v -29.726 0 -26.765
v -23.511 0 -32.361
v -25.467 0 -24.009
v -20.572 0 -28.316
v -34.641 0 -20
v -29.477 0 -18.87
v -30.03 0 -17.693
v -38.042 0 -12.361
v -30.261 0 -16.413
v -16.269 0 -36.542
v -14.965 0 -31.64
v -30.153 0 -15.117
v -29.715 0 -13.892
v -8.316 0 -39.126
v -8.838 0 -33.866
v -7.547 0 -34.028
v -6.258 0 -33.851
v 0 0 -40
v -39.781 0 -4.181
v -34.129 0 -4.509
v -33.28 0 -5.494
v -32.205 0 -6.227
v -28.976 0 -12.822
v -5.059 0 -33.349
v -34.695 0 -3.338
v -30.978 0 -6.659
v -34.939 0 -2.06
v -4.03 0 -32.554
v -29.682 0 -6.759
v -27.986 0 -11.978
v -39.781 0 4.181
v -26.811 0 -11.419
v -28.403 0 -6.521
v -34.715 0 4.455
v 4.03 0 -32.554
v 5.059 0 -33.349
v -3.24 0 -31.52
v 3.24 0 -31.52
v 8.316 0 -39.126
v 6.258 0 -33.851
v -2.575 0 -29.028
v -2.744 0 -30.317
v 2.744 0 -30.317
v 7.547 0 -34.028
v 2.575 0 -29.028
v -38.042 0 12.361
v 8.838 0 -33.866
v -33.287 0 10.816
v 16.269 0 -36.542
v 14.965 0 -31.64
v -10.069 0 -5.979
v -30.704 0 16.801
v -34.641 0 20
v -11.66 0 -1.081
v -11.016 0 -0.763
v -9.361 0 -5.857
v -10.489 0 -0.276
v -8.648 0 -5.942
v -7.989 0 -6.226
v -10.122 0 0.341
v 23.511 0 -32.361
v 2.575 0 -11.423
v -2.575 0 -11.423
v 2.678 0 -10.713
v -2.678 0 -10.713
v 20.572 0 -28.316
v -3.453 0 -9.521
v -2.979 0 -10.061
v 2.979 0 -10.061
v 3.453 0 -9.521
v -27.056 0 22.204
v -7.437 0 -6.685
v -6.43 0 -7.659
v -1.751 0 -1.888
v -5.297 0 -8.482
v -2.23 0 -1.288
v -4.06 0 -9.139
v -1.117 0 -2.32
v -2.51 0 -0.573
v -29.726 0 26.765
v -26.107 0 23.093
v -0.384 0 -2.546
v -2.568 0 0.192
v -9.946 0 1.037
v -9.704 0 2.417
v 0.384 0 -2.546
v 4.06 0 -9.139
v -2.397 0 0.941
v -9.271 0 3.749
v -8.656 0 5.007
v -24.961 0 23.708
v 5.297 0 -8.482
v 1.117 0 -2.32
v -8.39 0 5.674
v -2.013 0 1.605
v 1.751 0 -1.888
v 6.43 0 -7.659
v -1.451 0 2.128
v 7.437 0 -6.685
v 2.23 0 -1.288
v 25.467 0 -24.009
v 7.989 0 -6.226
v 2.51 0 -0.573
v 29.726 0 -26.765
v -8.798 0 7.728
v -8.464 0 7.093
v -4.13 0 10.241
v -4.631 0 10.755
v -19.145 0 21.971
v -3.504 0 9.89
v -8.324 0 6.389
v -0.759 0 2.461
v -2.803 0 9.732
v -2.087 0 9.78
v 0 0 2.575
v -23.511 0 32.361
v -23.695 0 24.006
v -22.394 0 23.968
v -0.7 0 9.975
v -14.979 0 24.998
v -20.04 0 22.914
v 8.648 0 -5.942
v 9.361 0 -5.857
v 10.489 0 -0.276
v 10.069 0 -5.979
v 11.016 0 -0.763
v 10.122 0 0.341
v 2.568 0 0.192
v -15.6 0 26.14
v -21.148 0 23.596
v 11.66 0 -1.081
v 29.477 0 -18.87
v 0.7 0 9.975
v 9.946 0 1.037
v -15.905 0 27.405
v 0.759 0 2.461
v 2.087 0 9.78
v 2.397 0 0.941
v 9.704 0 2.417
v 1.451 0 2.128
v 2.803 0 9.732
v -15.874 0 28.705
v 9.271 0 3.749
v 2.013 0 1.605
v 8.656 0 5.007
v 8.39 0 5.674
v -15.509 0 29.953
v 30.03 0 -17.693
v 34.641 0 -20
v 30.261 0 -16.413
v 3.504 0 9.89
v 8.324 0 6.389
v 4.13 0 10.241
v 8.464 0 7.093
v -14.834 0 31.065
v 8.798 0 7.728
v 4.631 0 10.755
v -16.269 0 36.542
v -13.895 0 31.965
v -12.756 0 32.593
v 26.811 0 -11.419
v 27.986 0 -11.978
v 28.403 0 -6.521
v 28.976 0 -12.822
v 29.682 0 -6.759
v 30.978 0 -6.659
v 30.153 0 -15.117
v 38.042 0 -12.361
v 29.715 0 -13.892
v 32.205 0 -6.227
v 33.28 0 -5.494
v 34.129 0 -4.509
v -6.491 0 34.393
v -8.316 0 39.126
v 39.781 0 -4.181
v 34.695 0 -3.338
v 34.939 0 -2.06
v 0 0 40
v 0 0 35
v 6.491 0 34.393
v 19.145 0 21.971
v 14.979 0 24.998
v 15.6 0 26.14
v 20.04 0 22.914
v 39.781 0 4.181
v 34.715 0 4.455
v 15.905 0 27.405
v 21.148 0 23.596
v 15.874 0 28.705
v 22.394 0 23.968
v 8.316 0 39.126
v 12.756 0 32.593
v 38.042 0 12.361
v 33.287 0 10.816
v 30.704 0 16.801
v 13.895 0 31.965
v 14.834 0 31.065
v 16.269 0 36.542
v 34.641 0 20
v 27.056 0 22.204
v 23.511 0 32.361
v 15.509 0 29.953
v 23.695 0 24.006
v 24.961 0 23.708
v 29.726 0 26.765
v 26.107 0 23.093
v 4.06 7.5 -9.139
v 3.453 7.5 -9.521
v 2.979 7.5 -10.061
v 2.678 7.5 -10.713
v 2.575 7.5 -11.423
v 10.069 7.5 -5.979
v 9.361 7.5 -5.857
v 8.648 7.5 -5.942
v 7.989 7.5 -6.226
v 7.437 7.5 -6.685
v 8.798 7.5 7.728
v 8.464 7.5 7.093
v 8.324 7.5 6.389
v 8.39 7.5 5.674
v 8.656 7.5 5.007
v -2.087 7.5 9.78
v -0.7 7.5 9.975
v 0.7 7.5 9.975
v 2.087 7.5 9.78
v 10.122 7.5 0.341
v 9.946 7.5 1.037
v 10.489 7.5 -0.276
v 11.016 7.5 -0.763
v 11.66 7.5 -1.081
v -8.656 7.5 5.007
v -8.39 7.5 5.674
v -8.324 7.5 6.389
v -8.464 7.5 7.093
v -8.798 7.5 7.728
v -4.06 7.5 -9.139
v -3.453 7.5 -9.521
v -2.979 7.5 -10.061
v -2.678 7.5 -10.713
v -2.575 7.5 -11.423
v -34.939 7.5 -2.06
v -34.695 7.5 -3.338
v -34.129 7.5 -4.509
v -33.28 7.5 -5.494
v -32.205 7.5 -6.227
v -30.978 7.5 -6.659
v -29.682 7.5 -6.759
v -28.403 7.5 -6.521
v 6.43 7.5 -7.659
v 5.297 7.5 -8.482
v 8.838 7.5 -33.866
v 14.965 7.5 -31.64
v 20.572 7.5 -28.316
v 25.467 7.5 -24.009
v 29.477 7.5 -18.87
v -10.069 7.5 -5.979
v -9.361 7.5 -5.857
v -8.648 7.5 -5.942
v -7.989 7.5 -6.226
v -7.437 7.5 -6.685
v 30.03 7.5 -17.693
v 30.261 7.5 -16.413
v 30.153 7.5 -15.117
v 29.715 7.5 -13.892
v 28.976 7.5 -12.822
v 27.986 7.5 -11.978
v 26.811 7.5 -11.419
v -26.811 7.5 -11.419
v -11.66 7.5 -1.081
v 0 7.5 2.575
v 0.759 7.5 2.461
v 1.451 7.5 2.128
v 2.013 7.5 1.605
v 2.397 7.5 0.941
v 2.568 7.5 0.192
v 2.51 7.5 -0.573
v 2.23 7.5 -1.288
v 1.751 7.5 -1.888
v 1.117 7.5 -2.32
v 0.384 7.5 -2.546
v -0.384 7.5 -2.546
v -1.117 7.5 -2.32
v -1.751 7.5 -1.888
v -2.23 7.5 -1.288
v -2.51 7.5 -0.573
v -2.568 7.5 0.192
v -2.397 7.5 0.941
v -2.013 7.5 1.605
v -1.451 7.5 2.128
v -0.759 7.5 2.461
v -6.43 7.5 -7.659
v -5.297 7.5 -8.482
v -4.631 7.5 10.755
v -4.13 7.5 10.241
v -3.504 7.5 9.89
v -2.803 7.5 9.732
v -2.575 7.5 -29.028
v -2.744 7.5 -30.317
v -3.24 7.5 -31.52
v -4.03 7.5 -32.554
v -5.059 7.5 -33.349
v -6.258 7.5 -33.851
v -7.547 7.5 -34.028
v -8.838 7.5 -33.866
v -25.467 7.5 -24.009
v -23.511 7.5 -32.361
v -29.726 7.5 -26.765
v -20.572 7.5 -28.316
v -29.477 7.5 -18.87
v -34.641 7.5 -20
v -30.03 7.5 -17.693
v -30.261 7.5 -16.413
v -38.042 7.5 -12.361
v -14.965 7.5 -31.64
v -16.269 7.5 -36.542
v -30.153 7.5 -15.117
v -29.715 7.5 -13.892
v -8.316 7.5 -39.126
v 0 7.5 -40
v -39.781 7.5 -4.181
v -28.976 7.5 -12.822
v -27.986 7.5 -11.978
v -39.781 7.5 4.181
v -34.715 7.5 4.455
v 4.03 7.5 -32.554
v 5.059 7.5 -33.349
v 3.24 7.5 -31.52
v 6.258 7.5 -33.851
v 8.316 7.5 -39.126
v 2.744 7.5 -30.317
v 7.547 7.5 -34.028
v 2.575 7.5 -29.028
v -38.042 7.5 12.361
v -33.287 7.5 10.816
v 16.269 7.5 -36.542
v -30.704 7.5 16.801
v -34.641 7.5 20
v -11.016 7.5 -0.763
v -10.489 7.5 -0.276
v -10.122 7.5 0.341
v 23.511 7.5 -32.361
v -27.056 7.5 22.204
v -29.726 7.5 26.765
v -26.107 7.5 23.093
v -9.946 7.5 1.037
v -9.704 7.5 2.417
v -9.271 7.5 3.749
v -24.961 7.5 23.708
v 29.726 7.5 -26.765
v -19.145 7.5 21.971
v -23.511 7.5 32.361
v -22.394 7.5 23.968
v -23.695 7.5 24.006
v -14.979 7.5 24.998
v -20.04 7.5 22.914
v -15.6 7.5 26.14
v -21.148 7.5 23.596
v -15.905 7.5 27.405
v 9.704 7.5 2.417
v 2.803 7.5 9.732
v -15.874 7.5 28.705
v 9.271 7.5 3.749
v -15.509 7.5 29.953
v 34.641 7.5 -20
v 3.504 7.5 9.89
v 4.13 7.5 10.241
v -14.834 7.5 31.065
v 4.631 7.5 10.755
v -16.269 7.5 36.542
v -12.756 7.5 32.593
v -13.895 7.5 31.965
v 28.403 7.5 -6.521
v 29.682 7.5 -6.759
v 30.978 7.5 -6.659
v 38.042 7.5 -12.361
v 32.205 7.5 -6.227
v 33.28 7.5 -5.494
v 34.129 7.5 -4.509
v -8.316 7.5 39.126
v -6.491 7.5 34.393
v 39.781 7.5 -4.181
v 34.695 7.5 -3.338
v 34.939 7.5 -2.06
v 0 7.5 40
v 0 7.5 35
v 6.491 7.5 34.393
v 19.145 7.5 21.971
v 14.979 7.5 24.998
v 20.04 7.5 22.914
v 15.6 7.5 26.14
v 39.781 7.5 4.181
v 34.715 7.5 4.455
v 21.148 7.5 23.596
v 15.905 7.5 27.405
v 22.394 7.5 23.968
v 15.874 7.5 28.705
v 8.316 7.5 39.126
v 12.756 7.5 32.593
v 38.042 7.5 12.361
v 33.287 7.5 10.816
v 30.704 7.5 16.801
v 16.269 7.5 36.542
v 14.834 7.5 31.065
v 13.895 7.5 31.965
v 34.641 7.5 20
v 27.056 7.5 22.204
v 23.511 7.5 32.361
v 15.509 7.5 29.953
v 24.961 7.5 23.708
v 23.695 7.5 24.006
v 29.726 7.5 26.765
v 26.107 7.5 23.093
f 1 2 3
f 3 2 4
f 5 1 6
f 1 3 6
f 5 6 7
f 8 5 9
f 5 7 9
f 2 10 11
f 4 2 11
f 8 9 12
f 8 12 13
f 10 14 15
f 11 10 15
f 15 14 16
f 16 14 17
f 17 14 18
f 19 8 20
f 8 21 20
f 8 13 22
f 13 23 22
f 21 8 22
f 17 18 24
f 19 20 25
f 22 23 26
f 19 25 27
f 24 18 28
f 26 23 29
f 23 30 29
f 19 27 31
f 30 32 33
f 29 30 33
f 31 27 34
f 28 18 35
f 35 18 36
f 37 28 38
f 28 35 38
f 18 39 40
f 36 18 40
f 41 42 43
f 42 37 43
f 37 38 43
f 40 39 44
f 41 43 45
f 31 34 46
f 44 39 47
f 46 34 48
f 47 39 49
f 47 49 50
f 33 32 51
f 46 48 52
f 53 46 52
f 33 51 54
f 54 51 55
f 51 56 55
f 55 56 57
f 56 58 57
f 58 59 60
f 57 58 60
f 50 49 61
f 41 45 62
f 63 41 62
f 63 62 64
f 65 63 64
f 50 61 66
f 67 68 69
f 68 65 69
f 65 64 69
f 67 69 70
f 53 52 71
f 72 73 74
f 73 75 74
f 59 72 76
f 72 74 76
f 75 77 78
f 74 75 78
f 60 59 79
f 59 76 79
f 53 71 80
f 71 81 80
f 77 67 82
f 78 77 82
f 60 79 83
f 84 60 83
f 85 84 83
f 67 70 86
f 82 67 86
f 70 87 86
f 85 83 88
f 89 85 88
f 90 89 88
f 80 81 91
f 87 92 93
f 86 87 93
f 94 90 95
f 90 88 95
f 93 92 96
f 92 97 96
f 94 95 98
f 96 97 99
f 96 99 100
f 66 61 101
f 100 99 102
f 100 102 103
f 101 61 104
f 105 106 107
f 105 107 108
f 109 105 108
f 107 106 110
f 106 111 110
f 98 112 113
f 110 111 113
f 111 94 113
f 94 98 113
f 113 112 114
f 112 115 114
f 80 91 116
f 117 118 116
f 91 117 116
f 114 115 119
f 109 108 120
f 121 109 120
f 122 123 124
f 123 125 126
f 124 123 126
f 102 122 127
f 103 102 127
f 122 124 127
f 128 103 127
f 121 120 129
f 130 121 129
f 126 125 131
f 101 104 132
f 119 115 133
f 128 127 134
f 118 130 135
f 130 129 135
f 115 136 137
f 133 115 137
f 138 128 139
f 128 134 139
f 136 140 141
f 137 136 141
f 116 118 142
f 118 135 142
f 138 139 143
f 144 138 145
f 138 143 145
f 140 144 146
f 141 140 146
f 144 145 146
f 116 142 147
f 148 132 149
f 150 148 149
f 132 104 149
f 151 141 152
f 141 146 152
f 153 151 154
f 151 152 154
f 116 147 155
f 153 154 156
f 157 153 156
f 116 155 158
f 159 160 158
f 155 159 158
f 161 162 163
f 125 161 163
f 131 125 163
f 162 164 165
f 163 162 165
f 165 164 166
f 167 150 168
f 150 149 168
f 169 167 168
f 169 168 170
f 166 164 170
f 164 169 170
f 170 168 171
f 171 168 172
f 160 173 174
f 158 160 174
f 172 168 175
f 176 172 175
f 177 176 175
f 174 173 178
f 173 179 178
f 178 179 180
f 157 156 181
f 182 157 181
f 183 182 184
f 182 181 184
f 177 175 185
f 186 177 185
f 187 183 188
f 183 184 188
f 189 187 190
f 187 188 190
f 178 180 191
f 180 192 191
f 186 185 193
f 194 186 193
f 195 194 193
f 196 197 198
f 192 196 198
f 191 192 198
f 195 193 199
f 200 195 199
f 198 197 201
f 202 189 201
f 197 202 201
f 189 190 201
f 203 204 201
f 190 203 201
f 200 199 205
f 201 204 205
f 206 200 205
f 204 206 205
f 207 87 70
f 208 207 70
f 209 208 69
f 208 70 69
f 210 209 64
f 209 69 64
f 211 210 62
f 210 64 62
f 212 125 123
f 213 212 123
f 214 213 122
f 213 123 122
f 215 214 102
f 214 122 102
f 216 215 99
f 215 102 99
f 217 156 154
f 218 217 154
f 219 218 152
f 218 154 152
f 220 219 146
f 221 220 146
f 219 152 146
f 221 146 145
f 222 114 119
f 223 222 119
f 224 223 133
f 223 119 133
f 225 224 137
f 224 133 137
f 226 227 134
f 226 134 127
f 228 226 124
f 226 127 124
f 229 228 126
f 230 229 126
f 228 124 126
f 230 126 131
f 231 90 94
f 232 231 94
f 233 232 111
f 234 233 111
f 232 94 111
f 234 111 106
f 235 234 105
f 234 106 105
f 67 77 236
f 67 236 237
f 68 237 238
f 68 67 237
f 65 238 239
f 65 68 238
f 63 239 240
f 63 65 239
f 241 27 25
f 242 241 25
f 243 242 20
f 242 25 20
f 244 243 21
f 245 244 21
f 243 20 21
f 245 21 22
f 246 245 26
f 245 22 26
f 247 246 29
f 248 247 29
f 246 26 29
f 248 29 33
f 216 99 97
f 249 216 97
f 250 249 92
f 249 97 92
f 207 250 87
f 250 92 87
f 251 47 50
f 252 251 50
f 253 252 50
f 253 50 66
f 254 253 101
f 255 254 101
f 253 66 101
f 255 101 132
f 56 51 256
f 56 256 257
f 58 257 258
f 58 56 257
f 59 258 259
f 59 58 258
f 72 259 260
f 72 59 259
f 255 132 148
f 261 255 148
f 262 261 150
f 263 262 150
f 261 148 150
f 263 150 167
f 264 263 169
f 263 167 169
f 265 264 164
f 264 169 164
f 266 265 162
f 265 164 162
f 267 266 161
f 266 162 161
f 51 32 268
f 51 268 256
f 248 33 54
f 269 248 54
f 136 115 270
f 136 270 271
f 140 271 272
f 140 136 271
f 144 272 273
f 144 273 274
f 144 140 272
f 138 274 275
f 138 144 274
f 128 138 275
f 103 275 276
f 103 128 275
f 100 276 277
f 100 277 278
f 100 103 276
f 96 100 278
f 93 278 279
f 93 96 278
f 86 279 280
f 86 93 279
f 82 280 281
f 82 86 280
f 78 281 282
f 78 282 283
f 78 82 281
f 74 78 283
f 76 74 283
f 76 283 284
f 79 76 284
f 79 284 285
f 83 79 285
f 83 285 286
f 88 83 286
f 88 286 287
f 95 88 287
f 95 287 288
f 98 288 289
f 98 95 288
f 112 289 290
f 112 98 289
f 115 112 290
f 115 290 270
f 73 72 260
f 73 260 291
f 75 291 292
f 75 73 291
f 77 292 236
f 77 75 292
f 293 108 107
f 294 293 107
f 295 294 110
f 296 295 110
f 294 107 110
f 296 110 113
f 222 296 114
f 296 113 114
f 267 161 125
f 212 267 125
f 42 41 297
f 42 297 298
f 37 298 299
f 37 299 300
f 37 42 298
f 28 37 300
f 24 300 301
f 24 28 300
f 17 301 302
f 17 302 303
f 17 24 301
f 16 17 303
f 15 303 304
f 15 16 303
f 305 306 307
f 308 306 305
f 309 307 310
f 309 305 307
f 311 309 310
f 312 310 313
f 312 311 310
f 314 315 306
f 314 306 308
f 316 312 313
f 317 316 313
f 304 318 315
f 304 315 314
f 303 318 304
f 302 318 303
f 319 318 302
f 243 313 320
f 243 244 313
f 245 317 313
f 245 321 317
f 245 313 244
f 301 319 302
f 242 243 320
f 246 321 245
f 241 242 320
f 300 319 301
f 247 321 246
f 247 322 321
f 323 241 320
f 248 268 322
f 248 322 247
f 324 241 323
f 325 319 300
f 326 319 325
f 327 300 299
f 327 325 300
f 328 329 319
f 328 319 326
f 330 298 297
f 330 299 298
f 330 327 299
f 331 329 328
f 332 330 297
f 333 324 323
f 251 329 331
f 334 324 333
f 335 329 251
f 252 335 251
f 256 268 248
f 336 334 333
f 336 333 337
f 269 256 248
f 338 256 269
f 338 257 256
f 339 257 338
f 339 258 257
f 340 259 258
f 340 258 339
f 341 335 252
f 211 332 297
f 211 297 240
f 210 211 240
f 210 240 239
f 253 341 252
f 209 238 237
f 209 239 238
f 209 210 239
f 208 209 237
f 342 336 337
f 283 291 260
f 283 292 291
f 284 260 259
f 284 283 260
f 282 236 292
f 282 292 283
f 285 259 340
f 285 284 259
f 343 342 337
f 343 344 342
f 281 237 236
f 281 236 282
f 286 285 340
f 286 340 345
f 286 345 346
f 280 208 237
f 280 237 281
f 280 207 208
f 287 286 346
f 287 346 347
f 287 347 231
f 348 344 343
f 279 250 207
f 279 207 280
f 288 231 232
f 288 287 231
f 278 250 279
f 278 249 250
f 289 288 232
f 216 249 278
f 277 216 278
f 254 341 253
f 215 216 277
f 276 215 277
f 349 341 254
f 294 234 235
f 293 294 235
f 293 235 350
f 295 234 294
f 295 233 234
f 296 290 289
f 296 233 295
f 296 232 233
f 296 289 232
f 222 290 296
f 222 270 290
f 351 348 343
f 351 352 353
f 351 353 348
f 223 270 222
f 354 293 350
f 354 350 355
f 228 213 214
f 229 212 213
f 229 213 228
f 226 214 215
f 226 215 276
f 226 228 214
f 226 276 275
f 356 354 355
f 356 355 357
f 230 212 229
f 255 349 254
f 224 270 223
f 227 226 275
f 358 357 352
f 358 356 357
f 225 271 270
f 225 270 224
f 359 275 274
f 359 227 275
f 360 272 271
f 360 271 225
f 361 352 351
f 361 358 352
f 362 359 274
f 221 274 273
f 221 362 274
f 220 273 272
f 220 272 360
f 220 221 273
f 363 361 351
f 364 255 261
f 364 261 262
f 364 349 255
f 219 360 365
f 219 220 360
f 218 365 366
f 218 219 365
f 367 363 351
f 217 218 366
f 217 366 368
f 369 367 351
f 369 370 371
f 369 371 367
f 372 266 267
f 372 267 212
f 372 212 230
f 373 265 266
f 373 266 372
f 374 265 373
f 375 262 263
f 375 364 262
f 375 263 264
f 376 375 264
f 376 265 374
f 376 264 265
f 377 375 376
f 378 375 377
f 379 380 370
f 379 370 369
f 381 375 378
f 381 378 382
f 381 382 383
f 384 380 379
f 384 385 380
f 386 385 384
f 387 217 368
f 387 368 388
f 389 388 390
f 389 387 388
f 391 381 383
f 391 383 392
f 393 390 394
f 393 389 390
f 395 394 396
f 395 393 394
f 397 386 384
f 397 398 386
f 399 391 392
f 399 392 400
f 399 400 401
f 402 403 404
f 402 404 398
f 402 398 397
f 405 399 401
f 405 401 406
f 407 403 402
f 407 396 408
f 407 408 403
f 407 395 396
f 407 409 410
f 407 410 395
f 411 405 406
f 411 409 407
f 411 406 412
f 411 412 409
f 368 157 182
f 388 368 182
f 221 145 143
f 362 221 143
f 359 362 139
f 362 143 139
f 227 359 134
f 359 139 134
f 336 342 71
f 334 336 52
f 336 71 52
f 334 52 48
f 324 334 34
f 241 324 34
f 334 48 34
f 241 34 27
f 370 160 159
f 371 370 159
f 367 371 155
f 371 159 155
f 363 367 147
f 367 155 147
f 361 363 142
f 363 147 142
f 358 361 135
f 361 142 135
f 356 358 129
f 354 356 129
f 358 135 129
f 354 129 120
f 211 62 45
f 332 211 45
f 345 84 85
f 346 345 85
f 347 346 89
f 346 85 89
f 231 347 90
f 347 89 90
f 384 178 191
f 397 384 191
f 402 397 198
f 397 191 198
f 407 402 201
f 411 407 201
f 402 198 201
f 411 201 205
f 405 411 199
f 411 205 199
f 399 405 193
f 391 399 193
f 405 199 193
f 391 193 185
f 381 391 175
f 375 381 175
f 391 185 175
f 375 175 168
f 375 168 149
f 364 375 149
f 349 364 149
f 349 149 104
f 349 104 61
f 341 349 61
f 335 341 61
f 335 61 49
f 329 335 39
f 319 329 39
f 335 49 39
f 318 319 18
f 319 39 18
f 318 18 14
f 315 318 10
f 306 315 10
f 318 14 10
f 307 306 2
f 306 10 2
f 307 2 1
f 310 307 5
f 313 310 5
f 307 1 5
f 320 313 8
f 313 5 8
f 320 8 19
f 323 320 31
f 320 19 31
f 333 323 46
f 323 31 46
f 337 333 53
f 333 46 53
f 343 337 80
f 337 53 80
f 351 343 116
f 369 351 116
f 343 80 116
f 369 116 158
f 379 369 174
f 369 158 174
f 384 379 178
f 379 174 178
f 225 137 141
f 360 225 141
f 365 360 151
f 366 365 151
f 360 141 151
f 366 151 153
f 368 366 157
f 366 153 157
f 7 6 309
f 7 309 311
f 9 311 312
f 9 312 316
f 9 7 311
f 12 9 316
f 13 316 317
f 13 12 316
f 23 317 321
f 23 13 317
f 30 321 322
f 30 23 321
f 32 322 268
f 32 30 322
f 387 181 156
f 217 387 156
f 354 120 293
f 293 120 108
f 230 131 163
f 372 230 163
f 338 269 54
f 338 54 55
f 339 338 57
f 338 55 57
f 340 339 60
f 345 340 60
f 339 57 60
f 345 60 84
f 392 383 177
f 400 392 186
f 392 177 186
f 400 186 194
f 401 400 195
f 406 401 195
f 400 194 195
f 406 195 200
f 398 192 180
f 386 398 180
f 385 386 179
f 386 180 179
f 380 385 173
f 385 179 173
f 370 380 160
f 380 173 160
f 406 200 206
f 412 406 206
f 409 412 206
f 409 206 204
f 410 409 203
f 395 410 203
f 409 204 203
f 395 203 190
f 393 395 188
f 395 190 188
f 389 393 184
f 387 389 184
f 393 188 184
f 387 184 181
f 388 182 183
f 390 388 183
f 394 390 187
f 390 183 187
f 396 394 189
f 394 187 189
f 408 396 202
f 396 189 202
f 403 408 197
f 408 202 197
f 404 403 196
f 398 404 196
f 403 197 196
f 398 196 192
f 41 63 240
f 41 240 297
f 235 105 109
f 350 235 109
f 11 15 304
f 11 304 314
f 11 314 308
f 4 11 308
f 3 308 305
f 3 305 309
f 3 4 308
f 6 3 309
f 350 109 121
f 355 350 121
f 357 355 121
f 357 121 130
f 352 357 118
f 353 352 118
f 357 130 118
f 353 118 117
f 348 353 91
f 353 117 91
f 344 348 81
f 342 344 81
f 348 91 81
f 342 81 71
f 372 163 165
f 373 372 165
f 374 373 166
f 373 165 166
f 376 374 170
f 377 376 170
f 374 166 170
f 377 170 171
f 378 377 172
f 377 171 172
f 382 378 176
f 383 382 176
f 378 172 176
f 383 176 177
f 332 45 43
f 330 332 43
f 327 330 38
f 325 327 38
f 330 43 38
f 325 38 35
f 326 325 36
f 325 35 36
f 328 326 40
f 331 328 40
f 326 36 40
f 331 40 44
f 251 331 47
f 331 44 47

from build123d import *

# Parameters (mm, degrees)
SKETCH1_R           = 40
SKETCH1_R_2         = 2.575
BOSS_EXTRUDE1_DEPTH = 7.5


with BuildPart() as part:
    # Sketch1 → Boss-Extrude1 (new body)
    with BuildSketch(Plane(origin=(0, 0, 0), x_dir=(1, 0, 0), z_dir=(0, 1, 0))):
        with Locations(Location((0, 0, 0), (0, 0, 270))):
            Circle(SKETCH1_R)
        with Locations(Location((0, 0, 0), (0, 0, 270))):
            Circle(SKETCH1_R_2, mode=Mode.SUBTRACT)
        with BuildLine():
            Line((-2.575, 11.423413457), (-2.575, 29.027906831))
            ThreePointArc((-2.575, 29.027906831), (-4.518245185, 32.984704779), (-8.8375, 33.865891303))
            ThreePointArc((-8.8375, 33.865891303), (-20.57248383, 28.315594803), (-29.477438916, 18.870097905))
            ThreePointArc((-29.477438916, 18.870097905), (-29.974103871, 14.489940856), (-26.811461186, 11.419087051))
            Line((-26.811461186, 11.419087051), (-10.068593046, 5.978999421))
            ThreePointArc((-10.068593046, 5.978999421), (-8.648029574, 5.942087171), (-7.436840448, 6.68531257))
            ThreePointArc((-7.436840448, 6.68531257), (-5.877852523, 8.090169944), (-4.06, 9.138730765))
            ThreePointArc((-4.06, 9.138730765), (-2.978872618, 10.060970797), (-2.575, 11.423413457))
        make_face(mode=Mode.SUBTRACT)
        with BuildLine():
            Line((2.575, 11.423413457), (2.575, 29.027906831))
            ThreePointArc((2.575, 29.027906831), (4.518245185, 32.984704779), (8.8375, 33.865891303))
            ThreePointArc((8.8375, 33.865891303), (20.57248383, 28.315594803), (29.477438916, 18.870097905))
            ThreePointArc((29.477438916, 18.870097905), (29.974103871, 14.489940856), (26.811461186, 11.419087051))
            Line((26.811461186, 11.419087051), (10.068593046, 5.978999421))
            ThreePointArc((10.068593046, 5.978999421), (8.648029574, 5.942087171), (7.436840448, 6.68531257))
            ThreePointArc((7.436840448, 6.68531257), (5.877852523, 8.090169944), (4.06, 9.138730765))
            ThreePointArc((4.06, 9.138730765), (2.978872618, 10.060970797), (2.575, 11.423413457))
        make_face(mode=Mode.SUBTRACT)
        with BuildLine():
            Line((11.660030567, 1.081058362), (28.402898707, 6.521145993))
            ThreePointArc((28.402898707, 6.521145993), (32.766532965, 5.895727806), (34.939314292, 2.06017398))
            ThreePointArc((34.939314292, 2.06017398), (33.28697807, -10.815594803), (27.055559151, -22.203529427))
            ThreePointArc((27.055559151, -22.203529427), (23.04326016, -24.029428835), (19.145394301, -21.970522913))
            Line((19.145394301, -21.970522913), (8.797732721, -7.728188595))
            ThreePointArc((8.797732721, -7.728188595), (8.323648831, -6.388558961), (8.656220166, -5.006980372))
            ThreePointArc((8.656220166, -5.006980372), (9.510565163, -3.090169944), (9.946058442, -1.037266343))
            ThreePointArc((9.946058442, -1.037266343), (10.4890741, 0.275934741), (11.660030567, 1.081058362))
        make_face(mode=Mode.SUBTRACT)
        with BuildLine():
            Line((4.6312952, -10.755282645), (14.97895678, -24.997616962))
            ThreePointArc((14.97895678, -24.997616962), (15.732585881, -29.340944607), (12.756183776, -32.592633761))
            ThreePointArc((12.756183776, -32.592633761), (0, -35), (-12.756183776, -32.592633761))
            ThreePointArc((-12.756183776, -32.592633761), (-15.732585881, -29.340944607), (-14.97895678, -24.997616962))
            Line((-14.97895678, -24.997616962), (-4.6312952, -10.755282645))
            ThreePointArc((-4.6312952, -10.755282645), (-3.503731686, -9.890433748), (-2.087002171, -9.77979662))
            ThreePointArc((-2.087002171, -9.77979662), (0, -10), (2.087002171, -9.77979662))
            ThreePointArc((2.087002171, -9.77979662), (3.503731686, -9.890433748), (4.6312952, -10.755282645))
        make_face(mode=Mode.SUBTRACT)
        with BuildLine():
            Line((-8.797732721, -7.728188595), (-19.145394301, -21.970522913))
            ThreePointArc((-19.145394301, -21.970522913), (-23.04326016, -24.029428835), (-27.055559151, -22.203529427))
            ThreePointArc((-27.055559151, -22.203529427), (-33.28697807, -10.815594803), (-34.939314292, 2.06017398))
            ThreePointArc((-34.939314292, 2.06017398), (-32.766532965, 5.895727806), (-28.402898707, 6.521145993))
            Line((-28.402898707, 6.521145993), (-11.660030567, 1.081058362))
            ThreePointArc((-11.660030567, 1.081058362), (-10.4890741, 0.275934741), (-9.946058442, -1.037266343))
            ThreePointArc((-9.946058442, -1.037266343), (-9.510565163, -3.090169944), (-8.656220166, -5.006980372))
            ThreePointArc((-8.656220166, -5.006980372), (-8.323648831, -6.388558961), (-8.797732721, -7.728188595))
        make_face(mode=Mode.SUBTRACT)
    extrude(amount=BOSS_EXTRUDE1_DEPTH)


solid = part.part
